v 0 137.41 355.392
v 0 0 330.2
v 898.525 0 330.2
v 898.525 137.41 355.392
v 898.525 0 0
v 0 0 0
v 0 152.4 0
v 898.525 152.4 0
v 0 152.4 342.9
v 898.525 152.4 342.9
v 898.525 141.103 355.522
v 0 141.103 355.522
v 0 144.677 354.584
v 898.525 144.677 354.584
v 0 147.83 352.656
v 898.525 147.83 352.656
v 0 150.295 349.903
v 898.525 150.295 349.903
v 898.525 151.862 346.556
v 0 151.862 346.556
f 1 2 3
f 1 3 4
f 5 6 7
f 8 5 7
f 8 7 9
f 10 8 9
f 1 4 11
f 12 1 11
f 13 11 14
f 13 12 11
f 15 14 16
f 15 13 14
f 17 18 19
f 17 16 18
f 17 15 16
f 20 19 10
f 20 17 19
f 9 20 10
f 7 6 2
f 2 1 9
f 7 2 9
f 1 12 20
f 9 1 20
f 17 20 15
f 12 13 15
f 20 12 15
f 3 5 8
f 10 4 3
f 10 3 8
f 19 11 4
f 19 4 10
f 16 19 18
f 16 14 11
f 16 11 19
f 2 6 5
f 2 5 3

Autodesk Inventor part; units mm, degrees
ref_plane "YZ Plane" through (0, 0, 0) normal (1, 0, 0) x (0, 1, 0)
ref_plane "XZ Plane" through (0, 0, 0) normal (0, 1, 0) x (-1, 0, 0)
ref_plane "XY Plane" through (0, 0, 0) normal (0, 0, 1) x (1, 0, 0)
sketch "Profile" plane through (0, 0, 0) normal (0, 0, 1) x (1, 0, 0)
  line L0 (0, 0) -> (0, 330.2)
  line L1 (0, 0) -> (152.4, 0)
  line L2 (152.4, 0) -> (152.4, 342.9)
  line L3 (152.4, 342.9) -> (139.7, 342.9) construction
  line L4 (152.4, 342.9) -> (139.7, 342.9) construction
  arc A0 (152.4, 342.9) -> (137.4098, 355.3918) centre (139.7, 342.9) ccw
  line L5 (0, 330.2) -> (137.4098, 355.3918)
  dimension "d0" = 330.2
  dimension "d1" = 152.4
  dimension "d2" = 342.9
  dimension "d3" = 12.7
  dimension "d4" = 12.7
sketch "Sketch1" plane through (0, 0, 0) normal (1, 0, 0) x (0, 1, 0)
  line L0 (0, 0) -> (0, 330.2)
  line L1 (0, 0) -> (152.4, 0)
  line L2 (152.4, 0) -> (152.4, 342.9)
  line L3 (152.4, 342.9) -> (139.7, 342.9) construction
  line L4 (152.4, 342.9) -> (139.7, 342.9) construction
  arc A0 (152.4, 342.9) -> (137.4098, 355.3918) centre (139.7, 342.9) ccw
  line L5 (0, 330.2) -> (137.4098, 355.3918)
extrude "Extrusion1" add sketch "Sketch1" along normal blind 898.525
properties part number "L" material "Granite, Cut, Polished"
